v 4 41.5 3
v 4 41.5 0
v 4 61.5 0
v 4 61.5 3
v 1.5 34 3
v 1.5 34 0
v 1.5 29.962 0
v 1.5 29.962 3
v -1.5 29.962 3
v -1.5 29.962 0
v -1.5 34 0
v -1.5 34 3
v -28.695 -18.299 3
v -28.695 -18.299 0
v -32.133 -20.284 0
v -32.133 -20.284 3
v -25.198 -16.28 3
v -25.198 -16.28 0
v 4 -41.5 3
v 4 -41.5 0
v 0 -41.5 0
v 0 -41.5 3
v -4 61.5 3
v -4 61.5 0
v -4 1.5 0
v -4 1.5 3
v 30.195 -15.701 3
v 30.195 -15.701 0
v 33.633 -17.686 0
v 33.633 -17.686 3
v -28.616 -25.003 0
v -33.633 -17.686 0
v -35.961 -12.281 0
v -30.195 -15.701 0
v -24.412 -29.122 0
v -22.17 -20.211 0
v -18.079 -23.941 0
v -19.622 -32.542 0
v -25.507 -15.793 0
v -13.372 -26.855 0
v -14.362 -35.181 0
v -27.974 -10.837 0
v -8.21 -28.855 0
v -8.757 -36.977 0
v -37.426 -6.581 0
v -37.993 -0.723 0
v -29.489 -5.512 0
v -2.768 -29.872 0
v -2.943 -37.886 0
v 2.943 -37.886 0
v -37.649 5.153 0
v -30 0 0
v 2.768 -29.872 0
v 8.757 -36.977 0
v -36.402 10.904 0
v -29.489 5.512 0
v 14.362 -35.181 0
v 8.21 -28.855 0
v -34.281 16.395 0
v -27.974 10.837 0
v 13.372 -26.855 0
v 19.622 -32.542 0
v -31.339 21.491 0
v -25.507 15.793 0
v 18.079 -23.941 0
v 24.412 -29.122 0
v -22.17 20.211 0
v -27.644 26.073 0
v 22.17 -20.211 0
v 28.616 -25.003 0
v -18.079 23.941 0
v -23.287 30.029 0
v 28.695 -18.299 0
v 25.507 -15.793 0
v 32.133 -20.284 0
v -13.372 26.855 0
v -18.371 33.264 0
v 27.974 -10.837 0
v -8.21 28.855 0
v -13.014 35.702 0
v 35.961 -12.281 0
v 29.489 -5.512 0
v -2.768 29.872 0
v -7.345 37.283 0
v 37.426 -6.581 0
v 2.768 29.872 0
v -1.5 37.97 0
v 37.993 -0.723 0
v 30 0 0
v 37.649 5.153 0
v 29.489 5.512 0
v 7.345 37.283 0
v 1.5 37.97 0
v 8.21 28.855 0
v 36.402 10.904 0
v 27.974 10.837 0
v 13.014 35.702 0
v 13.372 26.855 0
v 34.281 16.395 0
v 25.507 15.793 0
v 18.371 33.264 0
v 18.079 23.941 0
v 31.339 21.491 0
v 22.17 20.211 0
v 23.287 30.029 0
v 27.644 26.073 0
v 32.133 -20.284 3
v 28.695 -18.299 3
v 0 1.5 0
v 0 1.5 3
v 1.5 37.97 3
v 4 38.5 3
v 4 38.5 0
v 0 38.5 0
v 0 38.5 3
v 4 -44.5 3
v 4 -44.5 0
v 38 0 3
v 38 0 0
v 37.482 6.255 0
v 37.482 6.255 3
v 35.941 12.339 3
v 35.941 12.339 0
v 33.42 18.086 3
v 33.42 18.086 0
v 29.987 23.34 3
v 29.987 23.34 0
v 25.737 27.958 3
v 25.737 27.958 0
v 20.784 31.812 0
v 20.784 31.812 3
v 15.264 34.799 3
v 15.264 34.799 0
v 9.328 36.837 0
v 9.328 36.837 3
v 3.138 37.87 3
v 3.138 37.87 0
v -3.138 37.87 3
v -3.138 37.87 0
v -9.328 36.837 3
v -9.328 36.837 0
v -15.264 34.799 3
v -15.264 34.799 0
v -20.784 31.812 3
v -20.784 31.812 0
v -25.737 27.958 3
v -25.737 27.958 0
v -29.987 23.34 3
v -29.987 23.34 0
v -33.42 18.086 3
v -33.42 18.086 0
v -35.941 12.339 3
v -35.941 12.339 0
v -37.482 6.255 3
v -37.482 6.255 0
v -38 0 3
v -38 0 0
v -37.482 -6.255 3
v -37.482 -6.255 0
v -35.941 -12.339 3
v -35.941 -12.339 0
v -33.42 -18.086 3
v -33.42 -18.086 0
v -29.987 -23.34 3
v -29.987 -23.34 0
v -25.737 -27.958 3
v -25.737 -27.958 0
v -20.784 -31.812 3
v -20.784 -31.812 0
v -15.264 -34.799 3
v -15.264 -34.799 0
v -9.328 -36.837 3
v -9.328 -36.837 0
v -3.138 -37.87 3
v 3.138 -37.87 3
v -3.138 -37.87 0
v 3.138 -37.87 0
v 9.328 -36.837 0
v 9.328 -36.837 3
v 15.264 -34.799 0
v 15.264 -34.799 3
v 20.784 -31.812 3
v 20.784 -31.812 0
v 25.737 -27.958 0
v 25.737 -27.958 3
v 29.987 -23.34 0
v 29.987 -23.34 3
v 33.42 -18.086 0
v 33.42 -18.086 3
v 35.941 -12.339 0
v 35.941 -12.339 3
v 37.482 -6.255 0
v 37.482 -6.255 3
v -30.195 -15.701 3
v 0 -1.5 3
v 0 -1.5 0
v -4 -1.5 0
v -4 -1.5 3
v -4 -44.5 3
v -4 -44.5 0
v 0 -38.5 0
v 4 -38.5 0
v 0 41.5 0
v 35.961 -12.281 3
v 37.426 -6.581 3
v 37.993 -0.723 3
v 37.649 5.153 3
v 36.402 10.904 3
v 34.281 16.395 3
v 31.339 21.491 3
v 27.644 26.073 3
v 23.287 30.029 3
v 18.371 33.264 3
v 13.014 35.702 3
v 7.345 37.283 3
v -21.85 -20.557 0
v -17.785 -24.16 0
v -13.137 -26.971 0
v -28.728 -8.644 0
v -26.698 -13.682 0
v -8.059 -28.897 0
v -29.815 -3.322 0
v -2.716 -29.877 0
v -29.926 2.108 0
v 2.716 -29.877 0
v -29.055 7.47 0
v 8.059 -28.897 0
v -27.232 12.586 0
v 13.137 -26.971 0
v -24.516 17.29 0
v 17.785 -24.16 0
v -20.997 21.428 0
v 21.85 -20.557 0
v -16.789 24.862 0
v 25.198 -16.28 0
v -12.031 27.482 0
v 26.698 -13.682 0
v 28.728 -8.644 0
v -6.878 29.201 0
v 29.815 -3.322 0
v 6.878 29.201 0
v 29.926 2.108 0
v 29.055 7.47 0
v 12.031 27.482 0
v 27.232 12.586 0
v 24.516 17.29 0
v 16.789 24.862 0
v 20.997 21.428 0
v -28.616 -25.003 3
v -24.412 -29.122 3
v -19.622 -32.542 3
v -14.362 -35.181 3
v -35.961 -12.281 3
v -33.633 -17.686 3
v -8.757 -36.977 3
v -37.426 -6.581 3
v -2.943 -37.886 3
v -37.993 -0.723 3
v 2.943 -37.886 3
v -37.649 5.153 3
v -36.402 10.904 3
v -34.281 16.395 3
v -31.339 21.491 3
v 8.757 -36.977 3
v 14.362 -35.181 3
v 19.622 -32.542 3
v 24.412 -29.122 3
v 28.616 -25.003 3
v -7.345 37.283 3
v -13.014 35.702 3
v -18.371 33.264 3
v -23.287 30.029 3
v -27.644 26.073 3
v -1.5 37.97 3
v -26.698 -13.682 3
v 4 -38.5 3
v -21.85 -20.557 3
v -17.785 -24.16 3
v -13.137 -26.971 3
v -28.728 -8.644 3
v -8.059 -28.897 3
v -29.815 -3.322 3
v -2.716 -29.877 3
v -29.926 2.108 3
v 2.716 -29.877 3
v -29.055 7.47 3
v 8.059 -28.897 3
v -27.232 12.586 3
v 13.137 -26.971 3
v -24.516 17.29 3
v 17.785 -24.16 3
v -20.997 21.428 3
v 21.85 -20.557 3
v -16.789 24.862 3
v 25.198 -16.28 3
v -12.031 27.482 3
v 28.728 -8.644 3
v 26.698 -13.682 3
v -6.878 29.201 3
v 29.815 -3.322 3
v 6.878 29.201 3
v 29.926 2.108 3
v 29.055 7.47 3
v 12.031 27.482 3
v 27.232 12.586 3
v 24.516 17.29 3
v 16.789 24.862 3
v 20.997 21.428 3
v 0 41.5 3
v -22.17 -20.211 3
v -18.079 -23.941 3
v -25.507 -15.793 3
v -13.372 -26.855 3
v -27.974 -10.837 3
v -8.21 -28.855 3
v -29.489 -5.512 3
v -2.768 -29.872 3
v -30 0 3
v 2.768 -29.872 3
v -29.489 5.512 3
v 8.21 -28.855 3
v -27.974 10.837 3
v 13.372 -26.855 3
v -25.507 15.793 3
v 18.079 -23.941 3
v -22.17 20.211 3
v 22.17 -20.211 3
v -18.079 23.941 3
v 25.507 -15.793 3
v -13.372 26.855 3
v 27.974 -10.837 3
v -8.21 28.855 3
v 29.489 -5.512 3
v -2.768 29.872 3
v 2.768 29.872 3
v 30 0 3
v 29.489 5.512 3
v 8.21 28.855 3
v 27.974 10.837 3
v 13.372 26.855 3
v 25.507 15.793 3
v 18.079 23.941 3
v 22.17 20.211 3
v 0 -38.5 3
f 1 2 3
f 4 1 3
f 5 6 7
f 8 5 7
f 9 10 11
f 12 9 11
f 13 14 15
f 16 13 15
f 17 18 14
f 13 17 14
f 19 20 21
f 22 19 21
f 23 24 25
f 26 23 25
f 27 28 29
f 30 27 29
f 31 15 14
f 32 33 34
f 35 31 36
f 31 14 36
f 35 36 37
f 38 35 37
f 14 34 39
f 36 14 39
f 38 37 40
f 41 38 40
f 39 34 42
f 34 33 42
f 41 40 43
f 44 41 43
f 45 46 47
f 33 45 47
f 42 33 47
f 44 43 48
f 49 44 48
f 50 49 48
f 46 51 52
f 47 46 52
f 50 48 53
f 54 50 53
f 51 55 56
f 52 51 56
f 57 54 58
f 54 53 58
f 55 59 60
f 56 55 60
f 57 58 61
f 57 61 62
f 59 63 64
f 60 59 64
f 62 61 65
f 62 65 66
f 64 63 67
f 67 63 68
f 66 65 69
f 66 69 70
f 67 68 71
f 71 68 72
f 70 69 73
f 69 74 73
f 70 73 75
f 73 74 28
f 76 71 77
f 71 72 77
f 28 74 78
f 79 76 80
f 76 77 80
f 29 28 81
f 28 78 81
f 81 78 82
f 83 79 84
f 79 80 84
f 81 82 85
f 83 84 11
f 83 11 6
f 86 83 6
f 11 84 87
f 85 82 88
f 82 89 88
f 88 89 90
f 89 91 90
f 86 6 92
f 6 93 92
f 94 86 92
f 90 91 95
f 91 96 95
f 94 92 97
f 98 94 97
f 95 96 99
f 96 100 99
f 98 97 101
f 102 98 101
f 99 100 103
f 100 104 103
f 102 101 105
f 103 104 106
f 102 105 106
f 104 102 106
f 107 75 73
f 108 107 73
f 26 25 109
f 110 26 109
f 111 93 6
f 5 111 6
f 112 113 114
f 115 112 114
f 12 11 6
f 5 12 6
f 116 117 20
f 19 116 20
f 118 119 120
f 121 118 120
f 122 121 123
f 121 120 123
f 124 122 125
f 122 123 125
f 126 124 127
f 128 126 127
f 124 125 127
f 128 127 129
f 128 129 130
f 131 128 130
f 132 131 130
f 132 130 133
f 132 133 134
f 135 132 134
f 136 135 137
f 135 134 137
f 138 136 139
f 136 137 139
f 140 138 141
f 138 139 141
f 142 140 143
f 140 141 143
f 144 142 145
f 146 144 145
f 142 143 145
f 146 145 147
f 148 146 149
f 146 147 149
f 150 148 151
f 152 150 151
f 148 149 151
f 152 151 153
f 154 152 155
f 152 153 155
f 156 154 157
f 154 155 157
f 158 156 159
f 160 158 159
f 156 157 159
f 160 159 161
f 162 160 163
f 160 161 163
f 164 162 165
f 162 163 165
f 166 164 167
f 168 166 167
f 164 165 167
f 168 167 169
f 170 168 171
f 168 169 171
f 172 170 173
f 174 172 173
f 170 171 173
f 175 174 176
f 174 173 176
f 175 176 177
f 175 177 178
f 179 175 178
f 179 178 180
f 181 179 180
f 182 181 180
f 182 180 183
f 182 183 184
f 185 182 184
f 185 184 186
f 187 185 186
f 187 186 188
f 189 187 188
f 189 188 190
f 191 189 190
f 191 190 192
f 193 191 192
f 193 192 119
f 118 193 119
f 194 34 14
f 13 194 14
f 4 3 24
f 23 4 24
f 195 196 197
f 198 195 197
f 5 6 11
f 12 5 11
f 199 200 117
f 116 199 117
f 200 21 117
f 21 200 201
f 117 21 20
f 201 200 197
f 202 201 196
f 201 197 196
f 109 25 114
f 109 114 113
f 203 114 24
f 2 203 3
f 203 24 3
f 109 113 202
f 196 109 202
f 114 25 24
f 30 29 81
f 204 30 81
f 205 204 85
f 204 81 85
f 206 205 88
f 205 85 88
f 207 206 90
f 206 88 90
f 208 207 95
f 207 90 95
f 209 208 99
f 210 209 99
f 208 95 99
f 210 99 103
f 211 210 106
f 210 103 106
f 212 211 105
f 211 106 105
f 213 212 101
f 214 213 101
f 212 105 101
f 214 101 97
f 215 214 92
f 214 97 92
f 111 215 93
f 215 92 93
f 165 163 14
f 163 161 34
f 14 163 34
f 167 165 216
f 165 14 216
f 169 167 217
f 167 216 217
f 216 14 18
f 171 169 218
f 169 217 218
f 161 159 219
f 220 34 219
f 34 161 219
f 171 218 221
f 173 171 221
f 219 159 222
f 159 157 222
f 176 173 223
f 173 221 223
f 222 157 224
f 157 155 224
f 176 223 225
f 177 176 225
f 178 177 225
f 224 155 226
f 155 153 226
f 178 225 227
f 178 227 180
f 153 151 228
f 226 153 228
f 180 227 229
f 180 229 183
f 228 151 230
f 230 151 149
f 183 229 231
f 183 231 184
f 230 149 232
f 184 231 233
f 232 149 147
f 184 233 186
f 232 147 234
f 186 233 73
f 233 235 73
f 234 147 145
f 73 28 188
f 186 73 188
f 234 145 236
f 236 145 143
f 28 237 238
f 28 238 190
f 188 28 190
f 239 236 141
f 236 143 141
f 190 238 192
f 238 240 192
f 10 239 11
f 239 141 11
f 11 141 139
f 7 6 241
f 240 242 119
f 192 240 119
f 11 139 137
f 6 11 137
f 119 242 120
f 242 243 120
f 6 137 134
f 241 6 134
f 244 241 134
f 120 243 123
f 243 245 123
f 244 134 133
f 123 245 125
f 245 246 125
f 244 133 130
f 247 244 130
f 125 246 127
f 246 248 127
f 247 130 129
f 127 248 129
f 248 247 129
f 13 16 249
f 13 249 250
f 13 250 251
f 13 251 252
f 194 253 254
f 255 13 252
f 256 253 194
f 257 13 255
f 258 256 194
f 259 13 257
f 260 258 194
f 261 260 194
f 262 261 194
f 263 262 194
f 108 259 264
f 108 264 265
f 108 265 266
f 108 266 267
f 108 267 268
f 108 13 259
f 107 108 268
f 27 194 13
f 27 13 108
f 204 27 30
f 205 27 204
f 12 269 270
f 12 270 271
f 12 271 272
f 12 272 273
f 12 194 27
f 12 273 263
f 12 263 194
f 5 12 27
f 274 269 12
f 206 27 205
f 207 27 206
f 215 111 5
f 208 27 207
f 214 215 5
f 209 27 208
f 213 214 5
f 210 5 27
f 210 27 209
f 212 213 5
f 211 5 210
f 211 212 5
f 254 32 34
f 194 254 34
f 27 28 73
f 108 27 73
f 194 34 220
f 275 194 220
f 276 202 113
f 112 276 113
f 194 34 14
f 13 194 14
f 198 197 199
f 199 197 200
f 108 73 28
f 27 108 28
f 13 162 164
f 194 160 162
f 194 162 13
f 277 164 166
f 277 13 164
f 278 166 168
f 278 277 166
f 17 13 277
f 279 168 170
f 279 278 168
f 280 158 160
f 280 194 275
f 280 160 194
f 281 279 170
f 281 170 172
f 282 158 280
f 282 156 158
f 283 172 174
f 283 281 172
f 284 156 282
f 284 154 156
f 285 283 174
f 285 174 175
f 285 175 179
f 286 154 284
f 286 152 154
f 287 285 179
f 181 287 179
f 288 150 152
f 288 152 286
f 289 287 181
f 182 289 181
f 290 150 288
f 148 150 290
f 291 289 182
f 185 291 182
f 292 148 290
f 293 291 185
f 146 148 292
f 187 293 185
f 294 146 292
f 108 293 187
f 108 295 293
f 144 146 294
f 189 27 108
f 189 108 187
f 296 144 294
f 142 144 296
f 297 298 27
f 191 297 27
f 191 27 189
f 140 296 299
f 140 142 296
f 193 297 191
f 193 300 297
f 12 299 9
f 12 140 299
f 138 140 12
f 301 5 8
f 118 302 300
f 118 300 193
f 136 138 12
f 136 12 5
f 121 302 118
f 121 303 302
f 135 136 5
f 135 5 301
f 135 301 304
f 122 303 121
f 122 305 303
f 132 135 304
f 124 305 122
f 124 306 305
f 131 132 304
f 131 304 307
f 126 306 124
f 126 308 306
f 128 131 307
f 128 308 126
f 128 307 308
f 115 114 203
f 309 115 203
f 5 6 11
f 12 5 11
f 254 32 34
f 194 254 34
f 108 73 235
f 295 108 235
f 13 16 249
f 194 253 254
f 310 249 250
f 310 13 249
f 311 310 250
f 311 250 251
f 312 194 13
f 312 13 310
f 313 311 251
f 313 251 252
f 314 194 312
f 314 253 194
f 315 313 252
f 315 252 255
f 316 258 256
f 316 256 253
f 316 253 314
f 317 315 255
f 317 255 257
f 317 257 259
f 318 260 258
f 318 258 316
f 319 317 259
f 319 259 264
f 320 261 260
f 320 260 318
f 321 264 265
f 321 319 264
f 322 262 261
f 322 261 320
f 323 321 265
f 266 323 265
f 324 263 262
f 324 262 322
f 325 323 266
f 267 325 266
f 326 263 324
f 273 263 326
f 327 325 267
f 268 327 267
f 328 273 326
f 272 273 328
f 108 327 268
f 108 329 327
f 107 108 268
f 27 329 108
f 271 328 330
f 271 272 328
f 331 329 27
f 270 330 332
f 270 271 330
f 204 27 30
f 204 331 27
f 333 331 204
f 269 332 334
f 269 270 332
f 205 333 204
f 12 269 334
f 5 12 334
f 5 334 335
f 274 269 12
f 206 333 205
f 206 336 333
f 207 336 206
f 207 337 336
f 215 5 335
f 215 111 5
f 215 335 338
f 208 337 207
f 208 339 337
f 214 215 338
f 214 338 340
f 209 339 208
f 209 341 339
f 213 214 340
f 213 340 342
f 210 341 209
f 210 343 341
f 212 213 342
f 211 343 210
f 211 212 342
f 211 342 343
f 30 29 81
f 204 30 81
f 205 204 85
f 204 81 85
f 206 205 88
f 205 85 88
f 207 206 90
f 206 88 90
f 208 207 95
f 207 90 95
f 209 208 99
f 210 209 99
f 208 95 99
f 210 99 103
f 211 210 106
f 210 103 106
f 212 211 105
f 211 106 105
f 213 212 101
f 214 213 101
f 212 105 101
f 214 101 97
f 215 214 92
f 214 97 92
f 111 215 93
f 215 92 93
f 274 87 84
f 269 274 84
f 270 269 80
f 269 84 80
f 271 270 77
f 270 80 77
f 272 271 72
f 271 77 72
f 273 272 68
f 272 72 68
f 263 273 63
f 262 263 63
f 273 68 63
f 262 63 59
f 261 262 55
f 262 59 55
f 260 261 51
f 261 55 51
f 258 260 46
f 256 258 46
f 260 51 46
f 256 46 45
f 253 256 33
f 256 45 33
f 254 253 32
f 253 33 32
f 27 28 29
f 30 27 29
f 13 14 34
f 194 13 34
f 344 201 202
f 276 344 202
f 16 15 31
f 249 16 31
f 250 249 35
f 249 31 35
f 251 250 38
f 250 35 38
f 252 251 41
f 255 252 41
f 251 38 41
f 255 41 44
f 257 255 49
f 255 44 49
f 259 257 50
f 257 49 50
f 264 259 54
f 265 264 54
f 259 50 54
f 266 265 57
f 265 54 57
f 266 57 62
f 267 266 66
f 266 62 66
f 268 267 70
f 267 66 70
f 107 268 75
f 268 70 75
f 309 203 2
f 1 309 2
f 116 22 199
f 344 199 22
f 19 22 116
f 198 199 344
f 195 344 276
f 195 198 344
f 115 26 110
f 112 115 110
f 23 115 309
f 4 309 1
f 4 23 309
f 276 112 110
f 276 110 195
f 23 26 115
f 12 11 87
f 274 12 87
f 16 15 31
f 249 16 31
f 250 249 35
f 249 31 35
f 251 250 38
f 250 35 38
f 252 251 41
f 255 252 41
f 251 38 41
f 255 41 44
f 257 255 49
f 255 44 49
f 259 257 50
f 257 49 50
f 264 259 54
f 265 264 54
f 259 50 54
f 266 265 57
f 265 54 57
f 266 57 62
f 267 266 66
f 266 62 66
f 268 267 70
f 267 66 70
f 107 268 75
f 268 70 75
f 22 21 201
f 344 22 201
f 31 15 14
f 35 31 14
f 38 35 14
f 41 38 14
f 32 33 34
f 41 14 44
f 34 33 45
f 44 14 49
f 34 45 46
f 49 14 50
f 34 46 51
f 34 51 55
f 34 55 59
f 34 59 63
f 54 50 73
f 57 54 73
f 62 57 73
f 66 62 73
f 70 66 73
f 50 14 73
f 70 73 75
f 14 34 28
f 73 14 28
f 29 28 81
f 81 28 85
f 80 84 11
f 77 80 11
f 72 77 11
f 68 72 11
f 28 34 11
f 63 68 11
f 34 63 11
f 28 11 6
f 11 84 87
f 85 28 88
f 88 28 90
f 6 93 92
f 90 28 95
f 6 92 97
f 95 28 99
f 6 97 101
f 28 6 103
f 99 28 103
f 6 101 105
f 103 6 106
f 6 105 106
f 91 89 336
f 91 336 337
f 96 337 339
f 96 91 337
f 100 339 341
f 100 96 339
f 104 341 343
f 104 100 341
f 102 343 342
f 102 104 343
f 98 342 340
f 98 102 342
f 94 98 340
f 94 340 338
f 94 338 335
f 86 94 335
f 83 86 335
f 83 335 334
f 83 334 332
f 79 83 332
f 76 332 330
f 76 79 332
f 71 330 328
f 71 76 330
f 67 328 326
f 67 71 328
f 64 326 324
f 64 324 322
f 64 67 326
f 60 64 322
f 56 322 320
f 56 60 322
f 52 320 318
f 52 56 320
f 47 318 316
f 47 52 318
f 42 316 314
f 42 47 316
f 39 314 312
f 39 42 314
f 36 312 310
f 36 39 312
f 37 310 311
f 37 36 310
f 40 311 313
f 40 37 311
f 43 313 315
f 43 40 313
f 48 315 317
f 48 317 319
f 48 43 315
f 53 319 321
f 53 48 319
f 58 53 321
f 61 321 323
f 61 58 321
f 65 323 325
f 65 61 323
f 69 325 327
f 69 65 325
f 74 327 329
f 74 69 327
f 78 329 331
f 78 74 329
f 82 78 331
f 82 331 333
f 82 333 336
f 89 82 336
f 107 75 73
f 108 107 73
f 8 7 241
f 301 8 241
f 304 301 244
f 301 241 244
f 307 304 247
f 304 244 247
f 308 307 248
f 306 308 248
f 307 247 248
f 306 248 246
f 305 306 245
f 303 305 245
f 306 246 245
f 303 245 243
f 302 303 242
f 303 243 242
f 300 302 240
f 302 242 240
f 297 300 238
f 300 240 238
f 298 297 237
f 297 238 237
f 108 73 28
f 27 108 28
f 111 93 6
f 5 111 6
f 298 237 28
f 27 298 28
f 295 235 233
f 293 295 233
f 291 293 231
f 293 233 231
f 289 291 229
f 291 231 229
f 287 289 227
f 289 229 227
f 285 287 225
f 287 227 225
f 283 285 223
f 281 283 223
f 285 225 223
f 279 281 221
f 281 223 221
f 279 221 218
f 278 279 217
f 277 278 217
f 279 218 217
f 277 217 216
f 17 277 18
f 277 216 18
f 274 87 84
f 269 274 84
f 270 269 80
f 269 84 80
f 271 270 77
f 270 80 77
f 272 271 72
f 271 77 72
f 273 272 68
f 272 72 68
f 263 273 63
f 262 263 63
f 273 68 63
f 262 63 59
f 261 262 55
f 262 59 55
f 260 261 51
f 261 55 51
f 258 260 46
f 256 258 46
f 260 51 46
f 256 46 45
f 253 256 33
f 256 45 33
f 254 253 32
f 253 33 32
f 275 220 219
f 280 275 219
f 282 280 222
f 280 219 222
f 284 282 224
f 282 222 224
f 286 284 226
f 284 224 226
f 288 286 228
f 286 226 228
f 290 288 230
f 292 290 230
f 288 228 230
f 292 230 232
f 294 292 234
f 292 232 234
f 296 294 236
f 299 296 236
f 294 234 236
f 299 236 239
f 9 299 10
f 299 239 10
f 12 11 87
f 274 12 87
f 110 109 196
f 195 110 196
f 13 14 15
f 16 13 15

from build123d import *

# Parameters (mm, degrees)
F2_DEPTH = 3
F4_DEPTH = 3
F5_R     = 38
F6_DEPTH = 3
F7_R     = 30
F8_DEPTH = 3


with BuildPart() as f2:
    # F1 (on Top) → F2 (new body)
    with BuildSketch(Plane.XY):
        with BuildLine():
            Line((-1.5, 34), (-1.5, 37.9703831953))
            ThreePointArc((-1.5, 37.9703831953), (-32.9089653438, 19), (-33.6333164386, -17.686153492))
            Line((-33.6333164386, -17.686153492), (-30.1948637287, -15.7009618943))
            Line((-30.1948637287, -15.7009618943), (-28.6948637287, -18.2990381057))
            Line((-28.6948637287, -18.2990381057), (-32.1333164386, -20.2842297033))
            ThreePointArc((-32.1333164386, -20.2842297033), (0, -38), (32.1333164386, -20.2842297033))
            Line((32.1333164386, -20.2842297033), (28.6948637287, -18.2990381057))
            Line((28.6948637287, -18.2990381057), (30.1948637287, -15.7009618943))
            Line((30.1948637287, -15.7009618943), (33.6333164386, -17.686153492))
            ThreePointArc((33.6333164386, -17.686153492), (32.9089653438, 19), (1.5, 37.9703831953))
            Line((1.5, 37.9703831953), (1.5, 34))
            Line((1.5, 34), (-1.5, 34))
        make_face()
    extrude(amount=F2_DEPTH)


with BuildPart() as f4:
    # F3 (on Top) → F4 (new body)
    with BuildSketch(Plane.XY):
        Polygon((-4, -44.5), (4, -44.5), (4, -41.5), (0, -41.5), (0, -38.5), (4, -38.5), (4, 38.5), (0, 38.5), (0, 41.5), (4, 41.5), (4, 61.5), (-4, 61.5), (-4, 1.5), (0, 1.5), (0, -1.5), (-4, -1.5), align=None)
    extrude(amount=F4_DEPTH)


with BuildPart() as f6:
    # F5 (on Top) → F6 (new body)
    with BuildSketch(Plane.XY):
        Circle(F5_R)
        with BuildLine():
            ThreePointArc((-26.6982674329, -13.6821970489), (-25.9807612393, 15.0000015142), (-1.5, 29.9624765332))
            Line((-1.5, 29.9624765332), (-1.5, 34))
            Line((-1.5, 34), (1.5, 34))
            Line((1.5, 34), (1.5, 29.9624765332))
            ThreePointArc((1.5, 29.9624765332), (25.9807625506, 14.9999992429), (26.6982650406, -13.6822017169))
            Line((26.6982650406, -13.6822017169), (30.1948628136, -15.7009636541))
            Line((30.1948628136, -15.7009636541), (28.6948626622, -18.2990397781))
            Line((28.6948626622, -18.2990397781), (25.1982648892, -16.2802778409))
            ThreePointArc((25.1982648892, -16.2802778409), (-2.6227e-06, -30), (-25.1982677357, -16.2802734351))
            Line((-25.1982677357, -16.2802734351), (-28.6948658617, -18.2990347609))
            Line((-28.6948658617, -18.2990347609), (-30.1948655588, -15.7009583747))
            Line((-30.1948655588, -15.7009583747), (-26.6982674329, -13.6821970489))
        make_face(mode=Mode.SUBTRACT)
    extrude(amount=F6_DEPTH)


with BuildPart() as f8:
    # F7 (on Top) → F8 (new body)
    with BuildSketch(Plane.XY):
        with BuildLine():
            Line((-1.5, 34), (-1.5, 37.9703831953))
            ThreePointArc((-1.5, 37.9703831953), (-32.9089653438, 19), (-33.6333164386, -17.686153492))
            Line((-33.6333164386, -17.686153492), (-30.1948637287, -15.7009618943))
            Line((-30.1948637287, -15.7009618943), (-28.6948637287, -18.2990381057))
            Line((-28.6948637287, -18.2990381057), (-32.1333164386, -20.2842297033))
            ThreePointArc((-32.1333164386, -20.2842297033), (0, -38), (32.1333164386, -20.2842297033))
            Line((32.1333164386, -20.2842297033), (28.6948637287, -18.2990381057))
            Line((28.6948637287, -18.2990381057), (30.1948637287, -15.7009618943))
            Line((30.1948637287, -15.7009618943), (33.6333164386, -17.686153492))
            ThreePointArc((33.6333164386, -17.686153492), (32.9089653438, 19), (1.5, 37.9703831953))
            Line((1.5, 37.9703831953), (1.5, 34))
            Line((1.5, 34), (-1.5, 34))
        make_face()
        Circle(F7_R, mode=Mode.SUBTRACT)
    extrude(amount=F8_DEPTH)


solid = Compound([f2.part, f4.part, f6.part, f8.part])
